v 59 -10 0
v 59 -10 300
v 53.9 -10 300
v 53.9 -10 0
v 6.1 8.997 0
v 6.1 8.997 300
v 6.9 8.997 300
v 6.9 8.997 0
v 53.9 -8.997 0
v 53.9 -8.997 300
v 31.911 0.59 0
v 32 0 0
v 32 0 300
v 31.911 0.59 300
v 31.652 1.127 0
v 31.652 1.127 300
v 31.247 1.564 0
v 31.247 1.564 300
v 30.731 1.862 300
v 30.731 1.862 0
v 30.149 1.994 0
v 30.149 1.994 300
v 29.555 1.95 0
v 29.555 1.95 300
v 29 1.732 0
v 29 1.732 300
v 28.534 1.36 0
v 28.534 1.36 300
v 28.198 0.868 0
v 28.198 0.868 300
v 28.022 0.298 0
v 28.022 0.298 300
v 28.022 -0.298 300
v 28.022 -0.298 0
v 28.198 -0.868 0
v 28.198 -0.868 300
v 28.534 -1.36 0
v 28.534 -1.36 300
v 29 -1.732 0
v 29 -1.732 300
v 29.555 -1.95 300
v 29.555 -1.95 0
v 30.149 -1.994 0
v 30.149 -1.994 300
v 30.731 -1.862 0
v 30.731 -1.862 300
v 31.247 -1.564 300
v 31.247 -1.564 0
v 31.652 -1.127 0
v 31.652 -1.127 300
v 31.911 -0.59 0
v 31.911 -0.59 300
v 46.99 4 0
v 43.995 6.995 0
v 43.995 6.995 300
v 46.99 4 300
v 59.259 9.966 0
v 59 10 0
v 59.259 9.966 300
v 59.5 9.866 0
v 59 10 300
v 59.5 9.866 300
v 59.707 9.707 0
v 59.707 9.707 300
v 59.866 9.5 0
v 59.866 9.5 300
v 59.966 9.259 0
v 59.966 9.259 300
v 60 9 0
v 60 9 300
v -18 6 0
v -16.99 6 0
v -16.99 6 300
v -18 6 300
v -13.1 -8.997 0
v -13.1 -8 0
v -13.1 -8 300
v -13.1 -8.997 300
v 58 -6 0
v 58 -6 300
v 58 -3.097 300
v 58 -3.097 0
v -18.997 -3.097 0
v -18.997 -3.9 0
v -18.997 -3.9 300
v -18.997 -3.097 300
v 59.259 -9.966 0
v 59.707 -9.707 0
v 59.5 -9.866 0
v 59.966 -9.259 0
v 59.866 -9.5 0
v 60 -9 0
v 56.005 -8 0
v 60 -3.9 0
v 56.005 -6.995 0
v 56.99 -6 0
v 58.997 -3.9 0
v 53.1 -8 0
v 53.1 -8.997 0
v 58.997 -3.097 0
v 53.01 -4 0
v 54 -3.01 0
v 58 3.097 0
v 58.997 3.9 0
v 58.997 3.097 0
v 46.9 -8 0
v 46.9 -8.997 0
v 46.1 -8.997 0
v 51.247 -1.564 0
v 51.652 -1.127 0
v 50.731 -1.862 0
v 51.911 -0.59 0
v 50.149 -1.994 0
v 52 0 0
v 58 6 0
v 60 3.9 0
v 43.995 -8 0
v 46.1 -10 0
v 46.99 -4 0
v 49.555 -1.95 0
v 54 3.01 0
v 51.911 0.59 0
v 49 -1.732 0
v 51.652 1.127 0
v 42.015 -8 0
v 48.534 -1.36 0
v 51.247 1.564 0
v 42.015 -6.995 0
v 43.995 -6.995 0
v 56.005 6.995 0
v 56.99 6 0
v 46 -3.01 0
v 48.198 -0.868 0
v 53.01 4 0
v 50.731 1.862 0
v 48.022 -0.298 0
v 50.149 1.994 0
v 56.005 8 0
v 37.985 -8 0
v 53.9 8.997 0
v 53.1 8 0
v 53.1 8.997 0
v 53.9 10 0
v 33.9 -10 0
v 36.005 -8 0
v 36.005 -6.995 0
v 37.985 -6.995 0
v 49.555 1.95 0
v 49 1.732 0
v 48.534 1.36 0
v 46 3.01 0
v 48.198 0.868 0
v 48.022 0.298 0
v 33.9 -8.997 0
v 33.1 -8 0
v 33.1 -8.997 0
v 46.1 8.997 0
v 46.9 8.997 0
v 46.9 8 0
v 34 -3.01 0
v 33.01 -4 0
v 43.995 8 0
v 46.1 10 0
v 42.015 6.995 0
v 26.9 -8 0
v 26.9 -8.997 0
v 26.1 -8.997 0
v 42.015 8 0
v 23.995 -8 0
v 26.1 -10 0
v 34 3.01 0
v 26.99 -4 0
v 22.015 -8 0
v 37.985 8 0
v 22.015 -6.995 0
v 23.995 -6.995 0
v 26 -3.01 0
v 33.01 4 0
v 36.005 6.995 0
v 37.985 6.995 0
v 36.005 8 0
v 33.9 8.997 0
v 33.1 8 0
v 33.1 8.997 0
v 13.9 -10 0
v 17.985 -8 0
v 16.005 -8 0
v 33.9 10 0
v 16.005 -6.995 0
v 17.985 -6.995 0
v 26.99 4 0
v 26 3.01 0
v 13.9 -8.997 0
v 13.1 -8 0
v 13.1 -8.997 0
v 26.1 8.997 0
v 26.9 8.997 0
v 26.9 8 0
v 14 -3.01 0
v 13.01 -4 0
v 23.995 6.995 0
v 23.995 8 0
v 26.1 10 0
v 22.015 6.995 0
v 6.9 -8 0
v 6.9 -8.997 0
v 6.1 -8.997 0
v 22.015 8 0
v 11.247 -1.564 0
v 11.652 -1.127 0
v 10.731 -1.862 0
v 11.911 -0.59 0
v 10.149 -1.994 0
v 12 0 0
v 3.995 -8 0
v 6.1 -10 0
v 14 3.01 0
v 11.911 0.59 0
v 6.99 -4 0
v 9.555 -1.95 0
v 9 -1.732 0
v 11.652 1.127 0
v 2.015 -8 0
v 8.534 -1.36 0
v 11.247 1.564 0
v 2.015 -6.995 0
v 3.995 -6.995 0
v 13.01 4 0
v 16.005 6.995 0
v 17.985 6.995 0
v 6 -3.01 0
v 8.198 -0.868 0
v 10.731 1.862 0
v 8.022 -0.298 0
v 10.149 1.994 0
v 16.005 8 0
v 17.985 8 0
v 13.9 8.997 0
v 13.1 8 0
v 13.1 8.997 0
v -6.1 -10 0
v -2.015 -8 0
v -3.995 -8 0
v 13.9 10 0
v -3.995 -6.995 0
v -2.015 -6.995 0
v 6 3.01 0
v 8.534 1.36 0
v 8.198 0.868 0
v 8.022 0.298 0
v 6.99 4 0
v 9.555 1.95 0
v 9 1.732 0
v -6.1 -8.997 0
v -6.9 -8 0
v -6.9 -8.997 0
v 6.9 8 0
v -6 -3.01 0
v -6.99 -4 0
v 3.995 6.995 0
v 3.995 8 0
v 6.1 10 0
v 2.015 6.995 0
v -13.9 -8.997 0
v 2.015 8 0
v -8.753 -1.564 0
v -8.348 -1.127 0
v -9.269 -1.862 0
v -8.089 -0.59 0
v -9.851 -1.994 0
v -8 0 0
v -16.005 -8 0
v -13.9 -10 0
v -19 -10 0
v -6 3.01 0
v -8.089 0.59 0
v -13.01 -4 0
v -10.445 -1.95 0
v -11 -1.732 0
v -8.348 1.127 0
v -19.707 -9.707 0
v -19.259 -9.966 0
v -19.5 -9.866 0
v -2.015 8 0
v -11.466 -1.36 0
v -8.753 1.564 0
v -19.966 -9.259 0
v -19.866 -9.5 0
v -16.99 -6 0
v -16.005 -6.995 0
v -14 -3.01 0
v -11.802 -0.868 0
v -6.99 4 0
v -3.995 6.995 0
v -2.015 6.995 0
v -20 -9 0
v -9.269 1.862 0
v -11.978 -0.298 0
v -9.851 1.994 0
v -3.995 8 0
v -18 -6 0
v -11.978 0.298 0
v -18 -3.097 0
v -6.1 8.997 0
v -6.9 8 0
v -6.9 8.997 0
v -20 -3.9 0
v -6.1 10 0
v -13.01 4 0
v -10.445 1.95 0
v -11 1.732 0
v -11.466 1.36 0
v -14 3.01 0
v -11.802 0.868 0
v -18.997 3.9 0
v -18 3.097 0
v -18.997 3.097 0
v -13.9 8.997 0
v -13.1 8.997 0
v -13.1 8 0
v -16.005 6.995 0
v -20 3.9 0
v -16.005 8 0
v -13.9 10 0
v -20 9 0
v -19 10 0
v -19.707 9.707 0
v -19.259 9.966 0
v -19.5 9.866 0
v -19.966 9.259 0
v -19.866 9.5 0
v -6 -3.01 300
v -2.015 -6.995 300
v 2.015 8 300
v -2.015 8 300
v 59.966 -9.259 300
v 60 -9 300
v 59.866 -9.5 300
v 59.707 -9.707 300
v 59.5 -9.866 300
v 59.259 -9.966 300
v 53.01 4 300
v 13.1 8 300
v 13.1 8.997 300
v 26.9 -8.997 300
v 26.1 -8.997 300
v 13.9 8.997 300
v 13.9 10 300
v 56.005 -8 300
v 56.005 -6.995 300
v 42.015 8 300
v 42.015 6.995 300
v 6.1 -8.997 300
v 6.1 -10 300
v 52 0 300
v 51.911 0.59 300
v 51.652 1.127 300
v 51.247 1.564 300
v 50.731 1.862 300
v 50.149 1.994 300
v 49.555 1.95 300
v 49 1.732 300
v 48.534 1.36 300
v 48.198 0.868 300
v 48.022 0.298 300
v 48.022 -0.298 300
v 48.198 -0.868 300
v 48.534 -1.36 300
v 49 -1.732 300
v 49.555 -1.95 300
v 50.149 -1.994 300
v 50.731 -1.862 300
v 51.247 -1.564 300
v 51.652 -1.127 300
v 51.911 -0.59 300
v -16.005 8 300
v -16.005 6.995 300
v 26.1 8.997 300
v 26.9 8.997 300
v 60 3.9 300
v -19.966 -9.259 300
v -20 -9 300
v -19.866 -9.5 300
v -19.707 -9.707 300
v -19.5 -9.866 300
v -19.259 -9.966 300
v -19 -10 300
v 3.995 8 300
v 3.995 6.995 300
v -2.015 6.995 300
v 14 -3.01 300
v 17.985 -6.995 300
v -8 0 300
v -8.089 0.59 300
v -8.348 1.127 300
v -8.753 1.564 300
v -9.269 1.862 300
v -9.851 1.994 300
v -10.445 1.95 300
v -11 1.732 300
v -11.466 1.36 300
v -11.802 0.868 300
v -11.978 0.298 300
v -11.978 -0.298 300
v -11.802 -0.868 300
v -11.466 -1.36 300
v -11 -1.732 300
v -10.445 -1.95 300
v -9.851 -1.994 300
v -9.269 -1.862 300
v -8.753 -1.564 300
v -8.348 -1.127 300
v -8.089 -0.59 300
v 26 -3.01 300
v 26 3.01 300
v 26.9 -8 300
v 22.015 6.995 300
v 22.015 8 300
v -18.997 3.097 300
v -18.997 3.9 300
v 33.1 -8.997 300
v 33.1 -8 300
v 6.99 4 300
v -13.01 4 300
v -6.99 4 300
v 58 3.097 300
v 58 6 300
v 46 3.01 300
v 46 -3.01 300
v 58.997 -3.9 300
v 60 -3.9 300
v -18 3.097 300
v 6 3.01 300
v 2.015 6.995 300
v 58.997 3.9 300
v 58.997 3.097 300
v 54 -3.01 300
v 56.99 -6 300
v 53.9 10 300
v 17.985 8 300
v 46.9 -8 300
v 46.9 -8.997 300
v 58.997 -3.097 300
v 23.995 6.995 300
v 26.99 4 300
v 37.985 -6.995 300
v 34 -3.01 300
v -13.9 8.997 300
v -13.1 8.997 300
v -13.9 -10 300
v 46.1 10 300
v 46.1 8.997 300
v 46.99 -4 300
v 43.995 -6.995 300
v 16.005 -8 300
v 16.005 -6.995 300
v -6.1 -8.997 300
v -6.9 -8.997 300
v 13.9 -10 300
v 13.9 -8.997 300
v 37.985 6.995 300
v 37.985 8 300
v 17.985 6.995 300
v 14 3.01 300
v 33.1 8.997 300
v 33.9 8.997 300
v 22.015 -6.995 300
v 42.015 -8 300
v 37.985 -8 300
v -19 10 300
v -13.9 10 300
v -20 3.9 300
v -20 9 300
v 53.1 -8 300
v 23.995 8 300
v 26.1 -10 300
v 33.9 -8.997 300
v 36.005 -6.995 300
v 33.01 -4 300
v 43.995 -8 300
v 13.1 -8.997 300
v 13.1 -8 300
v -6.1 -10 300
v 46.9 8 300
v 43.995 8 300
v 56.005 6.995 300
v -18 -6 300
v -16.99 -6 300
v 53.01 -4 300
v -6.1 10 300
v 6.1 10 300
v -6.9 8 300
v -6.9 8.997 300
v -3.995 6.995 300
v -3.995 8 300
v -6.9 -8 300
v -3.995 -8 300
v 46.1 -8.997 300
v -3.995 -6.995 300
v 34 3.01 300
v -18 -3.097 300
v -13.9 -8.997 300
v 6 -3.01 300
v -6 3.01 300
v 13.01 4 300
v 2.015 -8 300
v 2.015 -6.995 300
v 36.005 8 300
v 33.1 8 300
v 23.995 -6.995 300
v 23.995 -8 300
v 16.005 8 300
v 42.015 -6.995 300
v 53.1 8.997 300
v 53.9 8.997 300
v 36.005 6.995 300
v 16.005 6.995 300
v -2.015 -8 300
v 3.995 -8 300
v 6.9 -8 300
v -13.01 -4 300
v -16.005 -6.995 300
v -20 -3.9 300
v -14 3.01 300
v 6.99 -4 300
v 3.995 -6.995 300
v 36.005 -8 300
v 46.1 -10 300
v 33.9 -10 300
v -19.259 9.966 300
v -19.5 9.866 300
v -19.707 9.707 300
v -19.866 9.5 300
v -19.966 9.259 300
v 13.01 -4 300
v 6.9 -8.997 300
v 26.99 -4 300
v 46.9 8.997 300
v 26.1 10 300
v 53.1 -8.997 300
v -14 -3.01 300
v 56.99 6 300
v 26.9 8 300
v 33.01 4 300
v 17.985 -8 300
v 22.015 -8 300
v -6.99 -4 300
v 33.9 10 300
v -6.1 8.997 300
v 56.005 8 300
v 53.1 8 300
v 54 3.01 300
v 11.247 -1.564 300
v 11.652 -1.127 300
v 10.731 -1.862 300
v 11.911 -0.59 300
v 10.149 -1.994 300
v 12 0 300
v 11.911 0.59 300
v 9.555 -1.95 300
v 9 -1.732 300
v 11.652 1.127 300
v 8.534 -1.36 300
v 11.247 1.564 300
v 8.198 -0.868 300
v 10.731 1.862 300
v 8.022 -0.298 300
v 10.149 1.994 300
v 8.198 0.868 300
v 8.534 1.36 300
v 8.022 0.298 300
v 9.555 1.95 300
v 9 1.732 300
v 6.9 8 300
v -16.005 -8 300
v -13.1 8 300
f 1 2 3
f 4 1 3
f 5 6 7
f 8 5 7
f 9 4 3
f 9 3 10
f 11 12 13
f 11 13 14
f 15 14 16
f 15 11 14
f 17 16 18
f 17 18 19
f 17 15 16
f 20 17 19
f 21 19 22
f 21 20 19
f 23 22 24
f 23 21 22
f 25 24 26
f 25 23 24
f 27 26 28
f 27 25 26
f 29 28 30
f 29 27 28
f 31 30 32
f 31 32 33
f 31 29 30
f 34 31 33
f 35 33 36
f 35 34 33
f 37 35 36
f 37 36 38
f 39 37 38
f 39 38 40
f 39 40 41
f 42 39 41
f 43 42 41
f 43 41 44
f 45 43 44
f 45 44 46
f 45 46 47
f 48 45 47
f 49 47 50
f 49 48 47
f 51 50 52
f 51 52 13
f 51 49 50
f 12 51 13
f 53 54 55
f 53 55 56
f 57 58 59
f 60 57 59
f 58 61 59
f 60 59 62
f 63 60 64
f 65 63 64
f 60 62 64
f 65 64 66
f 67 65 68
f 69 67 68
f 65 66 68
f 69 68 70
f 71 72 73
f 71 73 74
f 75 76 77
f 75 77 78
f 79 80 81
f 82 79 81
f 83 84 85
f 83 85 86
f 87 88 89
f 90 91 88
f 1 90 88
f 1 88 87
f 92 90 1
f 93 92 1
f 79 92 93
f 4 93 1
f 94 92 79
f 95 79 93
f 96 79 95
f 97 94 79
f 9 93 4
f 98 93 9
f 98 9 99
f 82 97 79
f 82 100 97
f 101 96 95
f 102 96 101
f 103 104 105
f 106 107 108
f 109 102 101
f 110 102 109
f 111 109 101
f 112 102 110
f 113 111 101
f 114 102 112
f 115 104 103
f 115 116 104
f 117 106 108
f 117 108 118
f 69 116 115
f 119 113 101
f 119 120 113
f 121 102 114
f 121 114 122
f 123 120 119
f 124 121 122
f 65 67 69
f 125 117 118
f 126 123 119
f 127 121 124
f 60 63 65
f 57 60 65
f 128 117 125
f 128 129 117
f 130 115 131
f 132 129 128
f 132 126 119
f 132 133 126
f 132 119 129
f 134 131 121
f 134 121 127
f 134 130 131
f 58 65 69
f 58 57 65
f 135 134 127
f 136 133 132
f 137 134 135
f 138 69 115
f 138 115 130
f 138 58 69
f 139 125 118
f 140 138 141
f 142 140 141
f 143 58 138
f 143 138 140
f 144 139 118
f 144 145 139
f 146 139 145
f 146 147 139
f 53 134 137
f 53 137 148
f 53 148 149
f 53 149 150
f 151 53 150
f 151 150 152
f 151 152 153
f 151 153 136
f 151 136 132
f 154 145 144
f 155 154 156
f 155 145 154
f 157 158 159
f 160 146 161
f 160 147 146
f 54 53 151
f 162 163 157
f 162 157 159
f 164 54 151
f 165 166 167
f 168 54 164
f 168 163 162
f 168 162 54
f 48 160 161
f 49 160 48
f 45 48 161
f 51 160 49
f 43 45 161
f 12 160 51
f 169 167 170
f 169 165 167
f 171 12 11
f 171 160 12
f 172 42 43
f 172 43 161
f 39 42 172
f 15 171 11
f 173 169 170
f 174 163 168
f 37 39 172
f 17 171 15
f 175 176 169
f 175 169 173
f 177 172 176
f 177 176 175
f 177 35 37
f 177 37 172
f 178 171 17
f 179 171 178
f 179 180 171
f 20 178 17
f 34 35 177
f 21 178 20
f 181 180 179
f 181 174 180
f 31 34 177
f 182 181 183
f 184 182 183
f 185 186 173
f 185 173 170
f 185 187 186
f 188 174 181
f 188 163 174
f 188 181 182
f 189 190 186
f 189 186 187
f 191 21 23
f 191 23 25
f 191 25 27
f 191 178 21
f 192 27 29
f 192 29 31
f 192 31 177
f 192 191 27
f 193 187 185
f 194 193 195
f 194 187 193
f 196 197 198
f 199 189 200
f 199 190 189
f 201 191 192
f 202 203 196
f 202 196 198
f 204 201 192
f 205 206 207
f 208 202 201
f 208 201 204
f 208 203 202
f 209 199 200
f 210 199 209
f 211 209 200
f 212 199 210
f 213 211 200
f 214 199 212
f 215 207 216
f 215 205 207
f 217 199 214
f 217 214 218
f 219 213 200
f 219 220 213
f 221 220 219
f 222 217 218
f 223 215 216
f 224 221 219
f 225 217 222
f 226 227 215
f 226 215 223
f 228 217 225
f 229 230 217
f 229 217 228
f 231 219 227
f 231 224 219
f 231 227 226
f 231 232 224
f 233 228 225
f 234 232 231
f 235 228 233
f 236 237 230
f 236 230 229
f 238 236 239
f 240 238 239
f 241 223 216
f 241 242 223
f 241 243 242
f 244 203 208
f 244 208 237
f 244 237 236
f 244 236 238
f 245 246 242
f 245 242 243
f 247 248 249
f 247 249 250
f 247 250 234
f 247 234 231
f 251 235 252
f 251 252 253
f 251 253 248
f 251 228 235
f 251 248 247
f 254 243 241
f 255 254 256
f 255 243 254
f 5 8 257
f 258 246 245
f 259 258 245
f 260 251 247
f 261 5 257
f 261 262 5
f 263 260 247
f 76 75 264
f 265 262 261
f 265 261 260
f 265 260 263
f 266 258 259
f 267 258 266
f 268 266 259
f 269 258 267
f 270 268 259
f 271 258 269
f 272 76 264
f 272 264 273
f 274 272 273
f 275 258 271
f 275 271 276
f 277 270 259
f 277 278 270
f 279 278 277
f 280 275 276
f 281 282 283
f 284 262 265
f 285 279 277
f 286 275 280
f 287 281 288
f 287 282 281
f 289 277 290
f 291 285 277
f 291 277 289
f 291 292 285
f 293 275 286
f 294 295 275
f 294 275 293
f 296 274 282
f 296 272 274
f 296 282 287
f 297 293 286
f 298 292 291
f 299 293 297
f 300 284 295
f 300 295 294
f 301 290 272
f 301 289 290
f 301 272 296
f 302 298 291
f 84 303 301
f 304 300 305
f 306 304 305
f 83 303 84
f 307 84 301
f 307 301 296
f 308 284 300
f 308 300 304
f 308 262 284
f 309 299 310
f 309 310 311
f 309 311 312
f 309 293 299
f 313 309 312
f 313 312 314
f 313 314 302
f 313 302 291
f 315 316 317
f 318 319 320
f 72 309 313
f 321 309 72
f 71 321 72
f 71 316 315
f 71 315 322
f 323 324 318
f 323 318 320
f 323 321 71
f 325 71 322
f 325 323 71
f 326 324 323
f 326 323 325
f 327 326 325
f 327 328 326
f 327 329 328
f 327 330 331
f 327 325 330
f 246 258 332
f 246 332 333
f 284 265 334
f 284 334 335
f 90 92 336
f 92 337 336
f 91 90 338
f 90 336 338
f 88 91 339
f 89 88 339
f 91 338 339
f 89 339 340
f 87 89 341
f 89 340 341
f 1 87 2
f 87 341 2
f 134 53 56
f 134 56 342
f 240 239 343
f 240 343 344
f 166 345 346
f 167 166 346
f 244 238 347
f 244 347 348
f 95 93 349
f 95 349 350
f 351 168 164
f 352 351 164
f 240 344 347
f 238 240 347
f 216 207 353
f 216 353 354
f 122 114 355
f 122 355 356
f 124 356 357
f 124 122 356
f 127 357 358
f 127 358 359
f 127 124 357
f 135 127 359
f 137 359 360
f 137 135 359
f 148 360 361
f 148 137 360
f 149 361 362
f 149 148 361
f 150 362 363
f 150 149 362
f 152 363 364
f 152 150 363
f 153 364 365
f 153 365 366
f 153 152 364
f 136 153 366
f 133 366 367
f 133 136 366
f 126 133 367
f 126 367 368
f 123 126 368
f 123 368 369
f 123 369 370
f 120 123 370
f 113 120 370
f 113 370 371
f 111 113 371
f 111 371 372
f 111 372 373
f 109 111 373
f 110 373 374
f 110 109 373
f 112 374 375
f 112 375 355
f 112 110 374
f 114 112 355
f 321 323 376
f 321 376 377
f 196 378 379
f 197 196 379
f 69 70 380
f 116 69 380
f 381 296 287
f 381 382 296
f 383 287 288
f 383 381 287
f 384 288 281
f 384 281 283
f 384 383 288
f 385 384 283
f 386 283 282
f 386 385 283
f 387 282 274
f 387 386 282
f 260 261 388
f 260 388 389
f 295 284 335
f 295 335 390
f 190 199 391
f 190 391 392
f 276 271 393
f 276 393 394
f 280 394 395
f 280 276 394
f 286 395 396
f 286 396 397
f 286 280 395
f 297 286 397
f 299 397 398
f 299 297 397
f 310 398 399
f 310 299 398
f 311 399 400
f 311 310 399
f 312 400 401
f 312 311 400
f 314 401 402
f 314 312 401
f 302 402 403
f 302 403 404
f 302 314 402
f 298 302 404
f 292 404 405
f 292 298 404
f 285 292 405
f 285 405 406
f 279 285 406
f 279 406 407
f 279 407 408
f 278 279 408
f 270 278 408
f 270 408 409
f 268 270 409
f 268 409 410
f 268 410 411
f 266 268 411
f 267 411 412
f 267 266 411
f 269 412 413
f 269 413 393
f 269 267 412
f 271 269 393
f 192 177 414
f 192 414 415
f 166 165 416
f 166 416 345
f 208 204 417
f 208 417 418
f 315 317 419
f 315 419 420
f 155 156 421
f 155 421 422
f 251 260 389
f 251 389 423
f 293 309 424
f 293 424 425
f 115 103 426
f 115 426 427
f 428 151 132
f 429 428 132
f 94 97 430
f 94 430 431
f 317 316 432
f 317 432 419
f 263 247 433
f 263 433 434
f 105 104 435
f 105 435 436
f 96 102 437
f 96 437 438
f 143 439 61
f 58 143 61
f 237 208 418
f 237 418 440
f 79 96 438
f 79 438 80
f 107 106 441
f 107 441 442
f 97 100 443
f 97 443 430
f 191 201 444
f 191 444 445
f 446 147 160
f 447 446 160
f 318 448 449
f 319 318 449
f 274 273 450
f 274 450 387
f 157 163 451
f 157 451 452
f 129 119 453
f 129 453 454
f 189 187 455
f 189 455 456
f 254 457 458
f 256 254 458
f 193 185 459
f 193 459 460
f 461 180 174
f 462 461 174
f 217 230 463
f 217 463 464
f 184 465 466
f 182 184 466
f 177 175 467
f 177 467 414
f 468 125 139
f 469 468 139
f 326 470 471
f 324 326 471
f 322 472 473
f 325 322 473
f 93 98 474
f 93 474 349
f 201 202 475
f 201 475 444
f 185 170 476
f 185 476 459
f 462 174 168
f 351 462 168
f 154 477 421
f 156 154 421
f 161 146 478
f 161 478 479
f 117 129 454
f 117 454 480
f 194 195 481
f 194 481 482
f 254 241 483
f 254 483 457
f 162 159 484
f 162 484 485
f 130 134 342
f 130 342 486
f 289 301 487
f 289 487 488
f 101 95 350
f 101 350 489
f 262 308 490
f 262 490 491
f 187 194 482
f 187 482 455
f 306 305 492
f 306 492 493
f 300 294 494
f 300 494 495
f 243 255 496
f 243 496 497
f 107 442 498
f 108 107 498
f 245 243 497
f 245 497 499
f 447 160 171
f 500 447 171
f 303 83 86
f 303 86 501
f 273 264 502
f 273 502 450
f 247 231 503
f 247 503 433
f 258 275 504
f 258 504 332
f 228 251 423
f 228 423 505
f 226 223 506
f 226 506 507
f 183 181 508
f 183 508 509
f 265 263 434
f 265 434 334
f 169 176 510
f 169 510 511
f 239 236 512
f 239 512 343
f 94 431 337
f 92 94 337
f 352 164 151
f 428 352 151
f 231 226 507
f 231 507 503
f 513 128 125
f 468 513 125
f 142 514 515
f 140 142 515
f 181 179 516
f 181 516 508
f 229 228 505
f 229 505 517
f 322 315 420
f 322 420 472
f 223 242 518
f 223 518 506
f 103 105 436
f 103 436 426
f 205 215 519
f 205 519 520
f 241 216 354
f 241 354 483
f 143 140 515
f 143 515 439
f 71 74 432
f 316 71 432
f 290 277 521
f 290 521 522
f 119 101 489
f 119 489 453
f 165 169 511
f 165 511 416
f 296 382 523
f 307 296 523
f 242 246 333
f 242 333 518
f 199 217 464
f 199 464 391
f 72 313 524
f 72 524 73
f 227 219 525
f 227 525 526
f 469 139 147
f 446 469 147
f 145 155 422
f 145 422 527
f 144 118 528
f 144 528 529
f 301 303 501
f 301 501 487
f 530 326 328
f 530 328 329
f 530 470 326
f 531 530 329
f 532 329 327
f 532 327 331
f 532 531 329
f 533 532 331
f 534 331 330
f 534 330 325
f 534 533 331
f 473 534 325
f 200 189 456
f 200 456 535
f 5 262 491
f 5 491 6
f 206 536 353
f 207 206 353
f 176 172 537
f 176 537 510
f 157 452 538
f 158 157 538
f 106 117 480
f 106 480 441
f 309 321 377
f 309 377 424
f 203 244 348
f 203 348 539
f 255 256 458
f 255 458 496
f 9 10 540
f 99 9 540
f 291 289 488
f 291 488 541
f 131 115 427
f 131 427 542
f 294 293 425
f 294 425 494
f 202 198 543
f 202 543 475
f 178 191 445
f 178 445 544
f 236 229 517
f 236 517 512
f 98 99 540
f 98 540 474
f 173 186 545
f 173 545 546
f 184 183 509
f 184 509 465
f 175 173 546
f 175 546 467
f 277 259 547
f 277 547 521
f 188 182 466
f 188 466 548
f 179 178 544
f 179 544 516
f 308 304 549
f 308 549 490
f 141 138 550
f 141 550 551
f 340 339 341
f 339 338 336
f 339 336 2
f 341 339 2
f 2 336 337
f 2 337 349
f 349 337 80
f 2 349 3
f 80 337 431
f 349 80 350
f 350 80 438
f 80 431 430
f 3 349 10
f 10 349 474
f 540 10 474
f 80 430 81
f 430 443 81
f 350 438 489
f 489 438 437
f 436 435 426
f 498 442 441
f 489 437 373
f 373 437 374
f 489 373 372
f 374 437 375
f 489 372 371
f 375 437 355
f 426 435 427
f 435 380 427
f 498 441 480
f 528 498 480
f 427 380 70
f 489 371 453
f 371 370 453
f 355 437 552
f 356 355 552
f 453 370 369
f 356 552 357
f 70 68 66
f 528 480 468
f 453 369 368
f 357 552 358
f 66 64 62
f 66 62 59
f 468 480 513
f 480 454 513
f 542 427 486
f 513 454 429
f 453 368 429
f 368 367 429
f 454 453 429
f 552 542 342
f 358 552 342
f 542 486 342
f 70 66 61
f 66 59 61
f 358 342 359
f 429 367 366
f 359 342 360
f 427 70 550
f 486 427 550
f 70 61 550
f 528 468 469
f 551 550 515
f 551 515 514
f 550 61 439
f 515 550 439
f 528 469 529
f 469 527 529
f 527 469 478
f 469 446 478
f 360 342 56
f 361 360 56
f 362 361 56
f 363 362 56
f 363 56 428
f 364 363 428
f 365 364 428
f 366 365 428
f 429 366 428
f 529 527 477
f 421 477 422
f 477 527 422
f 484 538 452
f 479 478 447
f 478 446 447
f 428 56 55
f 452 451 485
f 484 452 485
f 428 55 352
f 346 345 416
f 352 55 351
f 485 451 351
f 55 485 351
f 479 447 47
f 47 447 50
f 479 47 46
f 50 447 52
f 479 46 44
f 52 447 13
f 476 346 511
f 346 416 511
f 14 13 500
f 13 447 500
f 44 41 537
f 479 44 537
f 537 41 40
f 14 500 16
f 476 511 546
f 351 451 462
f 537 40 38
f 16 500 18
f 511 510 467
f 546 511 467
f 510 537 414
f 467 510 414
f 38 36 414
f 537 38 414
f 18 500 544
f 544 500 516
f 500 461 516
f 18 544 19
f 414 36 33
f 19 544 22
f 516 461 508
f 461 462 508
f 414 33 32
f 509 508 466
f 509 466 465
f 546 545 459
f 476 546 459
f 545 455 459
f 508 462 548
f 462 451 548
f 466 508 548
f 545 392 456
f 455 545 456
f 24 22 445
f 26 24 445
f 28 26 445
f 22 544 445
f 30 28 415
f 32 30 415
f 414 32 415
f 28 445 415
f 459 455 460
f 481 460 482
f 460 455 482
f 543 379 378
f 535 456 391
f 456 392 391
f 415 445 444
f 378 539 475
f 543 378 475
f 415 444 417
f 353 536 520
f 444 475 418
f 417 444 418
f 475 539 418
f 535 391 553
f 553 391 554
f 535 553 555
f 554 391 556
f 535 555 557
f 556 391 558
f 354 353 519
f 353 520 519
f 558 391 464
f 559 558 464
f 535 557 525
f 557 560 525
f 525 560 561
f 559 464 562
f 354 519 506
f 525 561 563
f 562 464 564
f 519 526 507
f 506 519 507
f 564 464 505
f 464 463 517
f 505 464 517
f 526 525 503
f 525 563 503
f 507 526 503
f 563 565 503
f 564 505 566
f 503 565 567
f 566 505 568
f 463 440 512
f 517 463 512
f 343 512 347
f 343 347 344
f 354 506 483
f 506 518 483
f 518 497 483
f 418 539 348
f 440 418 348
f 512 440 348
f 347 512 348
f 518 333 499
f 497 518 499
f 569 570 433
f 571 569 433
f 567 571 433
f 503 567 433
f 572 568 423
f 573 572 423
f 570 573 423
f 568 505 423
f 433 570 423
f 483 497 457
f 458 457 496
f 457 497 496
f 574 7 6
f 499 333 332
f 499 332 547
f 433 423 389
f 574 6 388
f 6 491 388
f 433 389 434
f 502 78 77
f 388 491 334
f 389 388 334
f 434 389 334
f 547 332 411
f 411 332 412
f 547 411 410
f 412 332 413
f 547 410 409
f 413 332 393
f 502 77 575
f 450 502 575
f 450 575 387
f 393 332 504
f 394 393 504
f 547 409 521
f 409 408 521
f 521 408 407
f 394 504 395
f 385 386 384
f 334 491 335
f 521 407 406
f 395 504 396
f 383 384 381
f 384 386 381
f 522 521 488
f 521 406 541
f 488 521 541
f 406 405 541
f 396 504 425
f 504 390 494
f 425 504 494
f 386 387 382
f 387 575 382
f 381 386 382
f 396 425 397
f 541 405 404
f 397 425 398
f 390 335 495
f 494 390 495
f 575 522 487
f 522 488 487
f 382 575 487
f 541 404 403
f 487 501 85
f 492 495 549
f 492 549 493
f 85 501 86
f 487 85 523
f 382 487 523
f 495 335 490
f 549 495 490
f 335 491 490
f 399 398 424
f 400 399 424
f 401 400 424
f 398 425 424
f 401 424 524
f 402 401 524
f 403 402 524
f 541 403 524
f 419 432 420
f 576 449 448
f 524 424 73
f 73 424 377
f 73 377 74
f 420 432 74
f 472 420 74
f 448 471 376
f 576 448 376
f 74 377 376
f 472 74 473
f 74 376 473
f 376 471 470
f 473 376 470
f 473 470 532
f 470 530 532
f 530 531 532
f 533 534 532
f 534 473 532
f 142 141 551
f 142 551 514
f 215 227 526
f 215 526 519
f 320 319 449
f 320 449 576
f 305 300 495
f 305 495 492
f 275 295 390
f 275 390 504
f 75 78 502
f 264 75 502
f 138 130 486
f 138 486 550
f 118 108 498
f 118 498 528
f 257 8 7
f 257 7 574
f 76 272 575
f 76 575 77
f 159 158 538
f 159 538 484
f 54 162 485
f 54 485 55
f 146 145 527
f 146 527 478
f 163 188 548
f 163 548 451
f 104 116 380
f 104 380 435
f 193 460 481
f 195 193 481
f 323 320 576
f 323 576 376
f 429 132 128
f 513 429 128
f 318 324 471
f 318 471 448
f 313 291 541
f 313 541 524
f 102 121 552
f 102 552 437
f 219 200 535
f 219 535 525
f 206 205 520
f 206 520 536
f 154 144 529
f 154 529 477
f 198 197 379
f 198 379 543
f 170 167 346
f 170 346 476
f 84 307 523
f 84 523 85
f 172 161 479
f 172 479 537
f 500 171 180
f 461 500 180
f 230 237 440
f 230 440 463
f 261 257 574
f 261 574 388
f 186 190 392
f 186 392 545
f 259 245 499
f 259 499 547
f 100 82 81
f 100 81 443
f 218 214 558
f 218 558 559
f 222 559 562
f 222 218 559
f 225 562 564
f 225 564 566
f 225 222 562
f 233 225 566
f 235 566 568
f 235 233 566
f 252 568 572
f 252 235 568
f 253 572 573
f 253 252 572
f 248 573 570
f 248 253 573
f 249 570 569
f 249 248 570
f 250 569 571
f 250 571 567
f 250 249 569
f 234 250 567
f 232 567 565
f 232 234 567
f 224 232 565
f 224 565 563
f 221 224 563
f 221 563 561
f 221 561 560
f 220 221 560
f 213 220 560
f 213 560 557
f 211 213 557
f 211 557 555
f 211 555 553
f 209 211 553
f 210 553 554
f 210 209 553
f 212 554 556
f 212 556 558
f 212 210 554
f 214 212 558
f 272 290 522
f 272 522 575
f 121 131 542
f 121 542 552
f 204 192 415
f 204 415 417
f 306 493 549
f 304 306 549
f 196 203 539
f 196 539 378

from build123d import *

# Parameters (mm, degrees)
SKETCH_1_R      = 2
EXTRUDE_1_DEPTH = 300
FILLET_1_R      = 1


with BuildPart() as part:
    # Sketch 1 → Extrude 1 (new body)
    with BuildSketch(Plane.XY):
        Polygon((-20, 10), (-13.9, 10), (-13.9, 8.996845012), (-13.1, 8.996845012), (-13.1, 8), (-16.004631122, 8), (-16.004631122, 6.994580616), (-13.010050506, 4), (-6.989949494, 4), (-3.995368878, 6.994580616), (-3.995368878, 8), (-6.9, 8), (-6.9, 8.996845012), (-6.1, 8.996845012), (-6.1, 10), (6.1, 10), (6.1, 8.996845012), (6.9, 8.996845012), (6.9, 8), (3.995368878, 8), (3.995368878, 6.994580616), (6.989949494, 4), (13.010050506, 4), (16.004631122, 6.994580616), (16.004631122, 8), (13.1, 8), (13.1, 8.996845012), (13.9, 8.996845012), (13.9, 10), (26.1, 10), (26.1, 8.996845012), (26.9, 8.996845012), (26.9, 8), (23.995368878, 8), (23.995368878, 6.994580616), (26.989949494, 4), (33.010050506, 4), (36.004631122, 6.994580616), (36.004631122, 8), (33.1, 8), (33.1, 8.996845012), (33.9, 8.996845012), (33.9, 10), (46.1, 10), (46.1, 8.996845012), (46.9, 8.996845012), (46.9, 8), (43.995368878, 8), (43.995368878, 6.994580616), (46.989949494, 4), (53.010050506, 4), (56.004631122, 6.994580616), (56.004631122, 8), (53.1, 8), (53.1, 8.996845012), (53.9, 8.996845012), (53.9, 10), (60, 10), (60, 3.9), (58.996845012, 3.9), (58.996845012, 3.09747601), (58, 3.09747601), (58, 6), (56.989949494, 6), (54, 3.010050506), (54, -3.010050506), (56.989949494, -6), (58, -6), (58, -3.09747601), (58.996845012, -3.09747601), (58.996845012, -3.9), (60, -3.9), (60, -10), (53.9, -10), (53.9, -8.996845012), (53.1, -8.996845012), (53.1, -8), (56.004631122, -8), (56.004631122, -6.994580616), (53.010050506, -4), (46.989949494, -4), (43.995368878, -6.994580616), (43.995368878, -8), (46.9, -8), (46.9, -8.996845012), (46.1, -8.996845012), (46.1, -10), (33.9, -10), (33.9, -8.996845012), (33.1, -8.996845012), (33.1, -8), (36.004631122, -8), (36.004631122, -6.994580616), (33.010050506, -4), (26.989949494, -4), (23.995368878, -6.994580616), (23.995368878, -8), (26.9, -8), (26.9, -8.996845012), (26.1, -8.996845012), (26.1, -10), (13.9, -10), (13.9, -8.996845012), (13.1, -8.996845012), (13.1, -8), (16.004631122, -8), (16.004631122, -6.994580616), (13.010050506, -4), (6.989949494, -4), (3.995368878, -6.994580616), (3.995368878, -8), (6.9, -8), (6.9, -8.996845012), (6.1, -8.996845012), (6.1, -10), (-6.1, -10), (-6.1, -8.996845012), (-6.9, -8.996845012), (-6.9, -8), (-3.995368878, -8), (-3.995368878, -6.994580616), (-6.989949494, -4), (-13.010050506, -4), (-16.004631122, -6.994580616), (-16.004631122, -8), (-13.1, -8), (-13.1, -8.996845012), (-13.9, -8.996845012), (-13.9, -10), (-20, -10), (-20, -3.9), (-18.996845012, -3.9), (-18.996845012, -3.09747601), (-18, -3.09747601), (-18, -6), (-16.989949494, -6), (-14, -3.010050506), (-14, 3.010050506), (-16.989949494, 6), (-18, 6), (-18, 3.09747601), (-18.996845012, 3.09747601), (-18.996845012, 3.9), (-20, 3.9), align=None)
        with Locations((-10, 0)):
            Circle(SKETCH_1_R, mode=Mode.SUBTRACT)
        with Locations((10, 0)):
            Circle(SKETCH_1_R, mode=Mode.SUBTRACT)
        with Locations((30, 0)):
            Circle(SKETCH_1_R, mode=Mode.SUBTRACT)
        with Locations((50, 0)):
            Circle(SKETCH_1_R, mode=Mode.SUBTRACT)
        Polygon((17.984530109, -6.994580616), (17.984530109, -8), (22.015469891, -8), (22.015469891, -6.994580616), (26, -3.010050506), (26, 3.010050506), (22.015469891, 6.994580616), (22.015469891, 8), (17.984530109, 8), (17.984530109, 6.994580616), (14, 3.010050506), (14, -3.010050506), align=None, mode=Mode.SUBTRACT)
        Polygon((2.015469891, -8), (2.015469891, -6.994580616), (6, -3.010050506), (6, 3.010050506), (2.015469891, 6.994580616), (2.015469891, 8), (-2.015469891, 8), (-2.015469891, 6.994580616), (-6, 3.010050506), (-6, -3.010050506), (-2.015469891, -6.994580616), (-2.015469891, -8), align=None, mode=Mode.SUBTRACT)
        Polygon((42.015469891, -8), (37.984530109, -8), (37.984530109, -6.994580616), (34, -3.010050506), (34, 3.010050506), (37.984530109, 6.994580616), (37.984530109, 8), (42.015469891, 8), (42.015469891, 6.994580616), (46, 3.010050506), (46, -3.010050506), (42.015469891, -6.994580616), align=None, mode=Mode.SUBTRACT)
    extrude(amount=EXTRUDE_1_DEPTH)

    # Fillet 1
    fillet_1_edges = [part.edges().sort_by_distance(p)[0] for p in [
        (60, 10, 150),
        (60, -10, 150),
        (-20, -10, 150),
        (-20, 10, 150),
    ]]
    fillet(fillet_1_edges, radius=FILLET_1_R)


solid = part.part
